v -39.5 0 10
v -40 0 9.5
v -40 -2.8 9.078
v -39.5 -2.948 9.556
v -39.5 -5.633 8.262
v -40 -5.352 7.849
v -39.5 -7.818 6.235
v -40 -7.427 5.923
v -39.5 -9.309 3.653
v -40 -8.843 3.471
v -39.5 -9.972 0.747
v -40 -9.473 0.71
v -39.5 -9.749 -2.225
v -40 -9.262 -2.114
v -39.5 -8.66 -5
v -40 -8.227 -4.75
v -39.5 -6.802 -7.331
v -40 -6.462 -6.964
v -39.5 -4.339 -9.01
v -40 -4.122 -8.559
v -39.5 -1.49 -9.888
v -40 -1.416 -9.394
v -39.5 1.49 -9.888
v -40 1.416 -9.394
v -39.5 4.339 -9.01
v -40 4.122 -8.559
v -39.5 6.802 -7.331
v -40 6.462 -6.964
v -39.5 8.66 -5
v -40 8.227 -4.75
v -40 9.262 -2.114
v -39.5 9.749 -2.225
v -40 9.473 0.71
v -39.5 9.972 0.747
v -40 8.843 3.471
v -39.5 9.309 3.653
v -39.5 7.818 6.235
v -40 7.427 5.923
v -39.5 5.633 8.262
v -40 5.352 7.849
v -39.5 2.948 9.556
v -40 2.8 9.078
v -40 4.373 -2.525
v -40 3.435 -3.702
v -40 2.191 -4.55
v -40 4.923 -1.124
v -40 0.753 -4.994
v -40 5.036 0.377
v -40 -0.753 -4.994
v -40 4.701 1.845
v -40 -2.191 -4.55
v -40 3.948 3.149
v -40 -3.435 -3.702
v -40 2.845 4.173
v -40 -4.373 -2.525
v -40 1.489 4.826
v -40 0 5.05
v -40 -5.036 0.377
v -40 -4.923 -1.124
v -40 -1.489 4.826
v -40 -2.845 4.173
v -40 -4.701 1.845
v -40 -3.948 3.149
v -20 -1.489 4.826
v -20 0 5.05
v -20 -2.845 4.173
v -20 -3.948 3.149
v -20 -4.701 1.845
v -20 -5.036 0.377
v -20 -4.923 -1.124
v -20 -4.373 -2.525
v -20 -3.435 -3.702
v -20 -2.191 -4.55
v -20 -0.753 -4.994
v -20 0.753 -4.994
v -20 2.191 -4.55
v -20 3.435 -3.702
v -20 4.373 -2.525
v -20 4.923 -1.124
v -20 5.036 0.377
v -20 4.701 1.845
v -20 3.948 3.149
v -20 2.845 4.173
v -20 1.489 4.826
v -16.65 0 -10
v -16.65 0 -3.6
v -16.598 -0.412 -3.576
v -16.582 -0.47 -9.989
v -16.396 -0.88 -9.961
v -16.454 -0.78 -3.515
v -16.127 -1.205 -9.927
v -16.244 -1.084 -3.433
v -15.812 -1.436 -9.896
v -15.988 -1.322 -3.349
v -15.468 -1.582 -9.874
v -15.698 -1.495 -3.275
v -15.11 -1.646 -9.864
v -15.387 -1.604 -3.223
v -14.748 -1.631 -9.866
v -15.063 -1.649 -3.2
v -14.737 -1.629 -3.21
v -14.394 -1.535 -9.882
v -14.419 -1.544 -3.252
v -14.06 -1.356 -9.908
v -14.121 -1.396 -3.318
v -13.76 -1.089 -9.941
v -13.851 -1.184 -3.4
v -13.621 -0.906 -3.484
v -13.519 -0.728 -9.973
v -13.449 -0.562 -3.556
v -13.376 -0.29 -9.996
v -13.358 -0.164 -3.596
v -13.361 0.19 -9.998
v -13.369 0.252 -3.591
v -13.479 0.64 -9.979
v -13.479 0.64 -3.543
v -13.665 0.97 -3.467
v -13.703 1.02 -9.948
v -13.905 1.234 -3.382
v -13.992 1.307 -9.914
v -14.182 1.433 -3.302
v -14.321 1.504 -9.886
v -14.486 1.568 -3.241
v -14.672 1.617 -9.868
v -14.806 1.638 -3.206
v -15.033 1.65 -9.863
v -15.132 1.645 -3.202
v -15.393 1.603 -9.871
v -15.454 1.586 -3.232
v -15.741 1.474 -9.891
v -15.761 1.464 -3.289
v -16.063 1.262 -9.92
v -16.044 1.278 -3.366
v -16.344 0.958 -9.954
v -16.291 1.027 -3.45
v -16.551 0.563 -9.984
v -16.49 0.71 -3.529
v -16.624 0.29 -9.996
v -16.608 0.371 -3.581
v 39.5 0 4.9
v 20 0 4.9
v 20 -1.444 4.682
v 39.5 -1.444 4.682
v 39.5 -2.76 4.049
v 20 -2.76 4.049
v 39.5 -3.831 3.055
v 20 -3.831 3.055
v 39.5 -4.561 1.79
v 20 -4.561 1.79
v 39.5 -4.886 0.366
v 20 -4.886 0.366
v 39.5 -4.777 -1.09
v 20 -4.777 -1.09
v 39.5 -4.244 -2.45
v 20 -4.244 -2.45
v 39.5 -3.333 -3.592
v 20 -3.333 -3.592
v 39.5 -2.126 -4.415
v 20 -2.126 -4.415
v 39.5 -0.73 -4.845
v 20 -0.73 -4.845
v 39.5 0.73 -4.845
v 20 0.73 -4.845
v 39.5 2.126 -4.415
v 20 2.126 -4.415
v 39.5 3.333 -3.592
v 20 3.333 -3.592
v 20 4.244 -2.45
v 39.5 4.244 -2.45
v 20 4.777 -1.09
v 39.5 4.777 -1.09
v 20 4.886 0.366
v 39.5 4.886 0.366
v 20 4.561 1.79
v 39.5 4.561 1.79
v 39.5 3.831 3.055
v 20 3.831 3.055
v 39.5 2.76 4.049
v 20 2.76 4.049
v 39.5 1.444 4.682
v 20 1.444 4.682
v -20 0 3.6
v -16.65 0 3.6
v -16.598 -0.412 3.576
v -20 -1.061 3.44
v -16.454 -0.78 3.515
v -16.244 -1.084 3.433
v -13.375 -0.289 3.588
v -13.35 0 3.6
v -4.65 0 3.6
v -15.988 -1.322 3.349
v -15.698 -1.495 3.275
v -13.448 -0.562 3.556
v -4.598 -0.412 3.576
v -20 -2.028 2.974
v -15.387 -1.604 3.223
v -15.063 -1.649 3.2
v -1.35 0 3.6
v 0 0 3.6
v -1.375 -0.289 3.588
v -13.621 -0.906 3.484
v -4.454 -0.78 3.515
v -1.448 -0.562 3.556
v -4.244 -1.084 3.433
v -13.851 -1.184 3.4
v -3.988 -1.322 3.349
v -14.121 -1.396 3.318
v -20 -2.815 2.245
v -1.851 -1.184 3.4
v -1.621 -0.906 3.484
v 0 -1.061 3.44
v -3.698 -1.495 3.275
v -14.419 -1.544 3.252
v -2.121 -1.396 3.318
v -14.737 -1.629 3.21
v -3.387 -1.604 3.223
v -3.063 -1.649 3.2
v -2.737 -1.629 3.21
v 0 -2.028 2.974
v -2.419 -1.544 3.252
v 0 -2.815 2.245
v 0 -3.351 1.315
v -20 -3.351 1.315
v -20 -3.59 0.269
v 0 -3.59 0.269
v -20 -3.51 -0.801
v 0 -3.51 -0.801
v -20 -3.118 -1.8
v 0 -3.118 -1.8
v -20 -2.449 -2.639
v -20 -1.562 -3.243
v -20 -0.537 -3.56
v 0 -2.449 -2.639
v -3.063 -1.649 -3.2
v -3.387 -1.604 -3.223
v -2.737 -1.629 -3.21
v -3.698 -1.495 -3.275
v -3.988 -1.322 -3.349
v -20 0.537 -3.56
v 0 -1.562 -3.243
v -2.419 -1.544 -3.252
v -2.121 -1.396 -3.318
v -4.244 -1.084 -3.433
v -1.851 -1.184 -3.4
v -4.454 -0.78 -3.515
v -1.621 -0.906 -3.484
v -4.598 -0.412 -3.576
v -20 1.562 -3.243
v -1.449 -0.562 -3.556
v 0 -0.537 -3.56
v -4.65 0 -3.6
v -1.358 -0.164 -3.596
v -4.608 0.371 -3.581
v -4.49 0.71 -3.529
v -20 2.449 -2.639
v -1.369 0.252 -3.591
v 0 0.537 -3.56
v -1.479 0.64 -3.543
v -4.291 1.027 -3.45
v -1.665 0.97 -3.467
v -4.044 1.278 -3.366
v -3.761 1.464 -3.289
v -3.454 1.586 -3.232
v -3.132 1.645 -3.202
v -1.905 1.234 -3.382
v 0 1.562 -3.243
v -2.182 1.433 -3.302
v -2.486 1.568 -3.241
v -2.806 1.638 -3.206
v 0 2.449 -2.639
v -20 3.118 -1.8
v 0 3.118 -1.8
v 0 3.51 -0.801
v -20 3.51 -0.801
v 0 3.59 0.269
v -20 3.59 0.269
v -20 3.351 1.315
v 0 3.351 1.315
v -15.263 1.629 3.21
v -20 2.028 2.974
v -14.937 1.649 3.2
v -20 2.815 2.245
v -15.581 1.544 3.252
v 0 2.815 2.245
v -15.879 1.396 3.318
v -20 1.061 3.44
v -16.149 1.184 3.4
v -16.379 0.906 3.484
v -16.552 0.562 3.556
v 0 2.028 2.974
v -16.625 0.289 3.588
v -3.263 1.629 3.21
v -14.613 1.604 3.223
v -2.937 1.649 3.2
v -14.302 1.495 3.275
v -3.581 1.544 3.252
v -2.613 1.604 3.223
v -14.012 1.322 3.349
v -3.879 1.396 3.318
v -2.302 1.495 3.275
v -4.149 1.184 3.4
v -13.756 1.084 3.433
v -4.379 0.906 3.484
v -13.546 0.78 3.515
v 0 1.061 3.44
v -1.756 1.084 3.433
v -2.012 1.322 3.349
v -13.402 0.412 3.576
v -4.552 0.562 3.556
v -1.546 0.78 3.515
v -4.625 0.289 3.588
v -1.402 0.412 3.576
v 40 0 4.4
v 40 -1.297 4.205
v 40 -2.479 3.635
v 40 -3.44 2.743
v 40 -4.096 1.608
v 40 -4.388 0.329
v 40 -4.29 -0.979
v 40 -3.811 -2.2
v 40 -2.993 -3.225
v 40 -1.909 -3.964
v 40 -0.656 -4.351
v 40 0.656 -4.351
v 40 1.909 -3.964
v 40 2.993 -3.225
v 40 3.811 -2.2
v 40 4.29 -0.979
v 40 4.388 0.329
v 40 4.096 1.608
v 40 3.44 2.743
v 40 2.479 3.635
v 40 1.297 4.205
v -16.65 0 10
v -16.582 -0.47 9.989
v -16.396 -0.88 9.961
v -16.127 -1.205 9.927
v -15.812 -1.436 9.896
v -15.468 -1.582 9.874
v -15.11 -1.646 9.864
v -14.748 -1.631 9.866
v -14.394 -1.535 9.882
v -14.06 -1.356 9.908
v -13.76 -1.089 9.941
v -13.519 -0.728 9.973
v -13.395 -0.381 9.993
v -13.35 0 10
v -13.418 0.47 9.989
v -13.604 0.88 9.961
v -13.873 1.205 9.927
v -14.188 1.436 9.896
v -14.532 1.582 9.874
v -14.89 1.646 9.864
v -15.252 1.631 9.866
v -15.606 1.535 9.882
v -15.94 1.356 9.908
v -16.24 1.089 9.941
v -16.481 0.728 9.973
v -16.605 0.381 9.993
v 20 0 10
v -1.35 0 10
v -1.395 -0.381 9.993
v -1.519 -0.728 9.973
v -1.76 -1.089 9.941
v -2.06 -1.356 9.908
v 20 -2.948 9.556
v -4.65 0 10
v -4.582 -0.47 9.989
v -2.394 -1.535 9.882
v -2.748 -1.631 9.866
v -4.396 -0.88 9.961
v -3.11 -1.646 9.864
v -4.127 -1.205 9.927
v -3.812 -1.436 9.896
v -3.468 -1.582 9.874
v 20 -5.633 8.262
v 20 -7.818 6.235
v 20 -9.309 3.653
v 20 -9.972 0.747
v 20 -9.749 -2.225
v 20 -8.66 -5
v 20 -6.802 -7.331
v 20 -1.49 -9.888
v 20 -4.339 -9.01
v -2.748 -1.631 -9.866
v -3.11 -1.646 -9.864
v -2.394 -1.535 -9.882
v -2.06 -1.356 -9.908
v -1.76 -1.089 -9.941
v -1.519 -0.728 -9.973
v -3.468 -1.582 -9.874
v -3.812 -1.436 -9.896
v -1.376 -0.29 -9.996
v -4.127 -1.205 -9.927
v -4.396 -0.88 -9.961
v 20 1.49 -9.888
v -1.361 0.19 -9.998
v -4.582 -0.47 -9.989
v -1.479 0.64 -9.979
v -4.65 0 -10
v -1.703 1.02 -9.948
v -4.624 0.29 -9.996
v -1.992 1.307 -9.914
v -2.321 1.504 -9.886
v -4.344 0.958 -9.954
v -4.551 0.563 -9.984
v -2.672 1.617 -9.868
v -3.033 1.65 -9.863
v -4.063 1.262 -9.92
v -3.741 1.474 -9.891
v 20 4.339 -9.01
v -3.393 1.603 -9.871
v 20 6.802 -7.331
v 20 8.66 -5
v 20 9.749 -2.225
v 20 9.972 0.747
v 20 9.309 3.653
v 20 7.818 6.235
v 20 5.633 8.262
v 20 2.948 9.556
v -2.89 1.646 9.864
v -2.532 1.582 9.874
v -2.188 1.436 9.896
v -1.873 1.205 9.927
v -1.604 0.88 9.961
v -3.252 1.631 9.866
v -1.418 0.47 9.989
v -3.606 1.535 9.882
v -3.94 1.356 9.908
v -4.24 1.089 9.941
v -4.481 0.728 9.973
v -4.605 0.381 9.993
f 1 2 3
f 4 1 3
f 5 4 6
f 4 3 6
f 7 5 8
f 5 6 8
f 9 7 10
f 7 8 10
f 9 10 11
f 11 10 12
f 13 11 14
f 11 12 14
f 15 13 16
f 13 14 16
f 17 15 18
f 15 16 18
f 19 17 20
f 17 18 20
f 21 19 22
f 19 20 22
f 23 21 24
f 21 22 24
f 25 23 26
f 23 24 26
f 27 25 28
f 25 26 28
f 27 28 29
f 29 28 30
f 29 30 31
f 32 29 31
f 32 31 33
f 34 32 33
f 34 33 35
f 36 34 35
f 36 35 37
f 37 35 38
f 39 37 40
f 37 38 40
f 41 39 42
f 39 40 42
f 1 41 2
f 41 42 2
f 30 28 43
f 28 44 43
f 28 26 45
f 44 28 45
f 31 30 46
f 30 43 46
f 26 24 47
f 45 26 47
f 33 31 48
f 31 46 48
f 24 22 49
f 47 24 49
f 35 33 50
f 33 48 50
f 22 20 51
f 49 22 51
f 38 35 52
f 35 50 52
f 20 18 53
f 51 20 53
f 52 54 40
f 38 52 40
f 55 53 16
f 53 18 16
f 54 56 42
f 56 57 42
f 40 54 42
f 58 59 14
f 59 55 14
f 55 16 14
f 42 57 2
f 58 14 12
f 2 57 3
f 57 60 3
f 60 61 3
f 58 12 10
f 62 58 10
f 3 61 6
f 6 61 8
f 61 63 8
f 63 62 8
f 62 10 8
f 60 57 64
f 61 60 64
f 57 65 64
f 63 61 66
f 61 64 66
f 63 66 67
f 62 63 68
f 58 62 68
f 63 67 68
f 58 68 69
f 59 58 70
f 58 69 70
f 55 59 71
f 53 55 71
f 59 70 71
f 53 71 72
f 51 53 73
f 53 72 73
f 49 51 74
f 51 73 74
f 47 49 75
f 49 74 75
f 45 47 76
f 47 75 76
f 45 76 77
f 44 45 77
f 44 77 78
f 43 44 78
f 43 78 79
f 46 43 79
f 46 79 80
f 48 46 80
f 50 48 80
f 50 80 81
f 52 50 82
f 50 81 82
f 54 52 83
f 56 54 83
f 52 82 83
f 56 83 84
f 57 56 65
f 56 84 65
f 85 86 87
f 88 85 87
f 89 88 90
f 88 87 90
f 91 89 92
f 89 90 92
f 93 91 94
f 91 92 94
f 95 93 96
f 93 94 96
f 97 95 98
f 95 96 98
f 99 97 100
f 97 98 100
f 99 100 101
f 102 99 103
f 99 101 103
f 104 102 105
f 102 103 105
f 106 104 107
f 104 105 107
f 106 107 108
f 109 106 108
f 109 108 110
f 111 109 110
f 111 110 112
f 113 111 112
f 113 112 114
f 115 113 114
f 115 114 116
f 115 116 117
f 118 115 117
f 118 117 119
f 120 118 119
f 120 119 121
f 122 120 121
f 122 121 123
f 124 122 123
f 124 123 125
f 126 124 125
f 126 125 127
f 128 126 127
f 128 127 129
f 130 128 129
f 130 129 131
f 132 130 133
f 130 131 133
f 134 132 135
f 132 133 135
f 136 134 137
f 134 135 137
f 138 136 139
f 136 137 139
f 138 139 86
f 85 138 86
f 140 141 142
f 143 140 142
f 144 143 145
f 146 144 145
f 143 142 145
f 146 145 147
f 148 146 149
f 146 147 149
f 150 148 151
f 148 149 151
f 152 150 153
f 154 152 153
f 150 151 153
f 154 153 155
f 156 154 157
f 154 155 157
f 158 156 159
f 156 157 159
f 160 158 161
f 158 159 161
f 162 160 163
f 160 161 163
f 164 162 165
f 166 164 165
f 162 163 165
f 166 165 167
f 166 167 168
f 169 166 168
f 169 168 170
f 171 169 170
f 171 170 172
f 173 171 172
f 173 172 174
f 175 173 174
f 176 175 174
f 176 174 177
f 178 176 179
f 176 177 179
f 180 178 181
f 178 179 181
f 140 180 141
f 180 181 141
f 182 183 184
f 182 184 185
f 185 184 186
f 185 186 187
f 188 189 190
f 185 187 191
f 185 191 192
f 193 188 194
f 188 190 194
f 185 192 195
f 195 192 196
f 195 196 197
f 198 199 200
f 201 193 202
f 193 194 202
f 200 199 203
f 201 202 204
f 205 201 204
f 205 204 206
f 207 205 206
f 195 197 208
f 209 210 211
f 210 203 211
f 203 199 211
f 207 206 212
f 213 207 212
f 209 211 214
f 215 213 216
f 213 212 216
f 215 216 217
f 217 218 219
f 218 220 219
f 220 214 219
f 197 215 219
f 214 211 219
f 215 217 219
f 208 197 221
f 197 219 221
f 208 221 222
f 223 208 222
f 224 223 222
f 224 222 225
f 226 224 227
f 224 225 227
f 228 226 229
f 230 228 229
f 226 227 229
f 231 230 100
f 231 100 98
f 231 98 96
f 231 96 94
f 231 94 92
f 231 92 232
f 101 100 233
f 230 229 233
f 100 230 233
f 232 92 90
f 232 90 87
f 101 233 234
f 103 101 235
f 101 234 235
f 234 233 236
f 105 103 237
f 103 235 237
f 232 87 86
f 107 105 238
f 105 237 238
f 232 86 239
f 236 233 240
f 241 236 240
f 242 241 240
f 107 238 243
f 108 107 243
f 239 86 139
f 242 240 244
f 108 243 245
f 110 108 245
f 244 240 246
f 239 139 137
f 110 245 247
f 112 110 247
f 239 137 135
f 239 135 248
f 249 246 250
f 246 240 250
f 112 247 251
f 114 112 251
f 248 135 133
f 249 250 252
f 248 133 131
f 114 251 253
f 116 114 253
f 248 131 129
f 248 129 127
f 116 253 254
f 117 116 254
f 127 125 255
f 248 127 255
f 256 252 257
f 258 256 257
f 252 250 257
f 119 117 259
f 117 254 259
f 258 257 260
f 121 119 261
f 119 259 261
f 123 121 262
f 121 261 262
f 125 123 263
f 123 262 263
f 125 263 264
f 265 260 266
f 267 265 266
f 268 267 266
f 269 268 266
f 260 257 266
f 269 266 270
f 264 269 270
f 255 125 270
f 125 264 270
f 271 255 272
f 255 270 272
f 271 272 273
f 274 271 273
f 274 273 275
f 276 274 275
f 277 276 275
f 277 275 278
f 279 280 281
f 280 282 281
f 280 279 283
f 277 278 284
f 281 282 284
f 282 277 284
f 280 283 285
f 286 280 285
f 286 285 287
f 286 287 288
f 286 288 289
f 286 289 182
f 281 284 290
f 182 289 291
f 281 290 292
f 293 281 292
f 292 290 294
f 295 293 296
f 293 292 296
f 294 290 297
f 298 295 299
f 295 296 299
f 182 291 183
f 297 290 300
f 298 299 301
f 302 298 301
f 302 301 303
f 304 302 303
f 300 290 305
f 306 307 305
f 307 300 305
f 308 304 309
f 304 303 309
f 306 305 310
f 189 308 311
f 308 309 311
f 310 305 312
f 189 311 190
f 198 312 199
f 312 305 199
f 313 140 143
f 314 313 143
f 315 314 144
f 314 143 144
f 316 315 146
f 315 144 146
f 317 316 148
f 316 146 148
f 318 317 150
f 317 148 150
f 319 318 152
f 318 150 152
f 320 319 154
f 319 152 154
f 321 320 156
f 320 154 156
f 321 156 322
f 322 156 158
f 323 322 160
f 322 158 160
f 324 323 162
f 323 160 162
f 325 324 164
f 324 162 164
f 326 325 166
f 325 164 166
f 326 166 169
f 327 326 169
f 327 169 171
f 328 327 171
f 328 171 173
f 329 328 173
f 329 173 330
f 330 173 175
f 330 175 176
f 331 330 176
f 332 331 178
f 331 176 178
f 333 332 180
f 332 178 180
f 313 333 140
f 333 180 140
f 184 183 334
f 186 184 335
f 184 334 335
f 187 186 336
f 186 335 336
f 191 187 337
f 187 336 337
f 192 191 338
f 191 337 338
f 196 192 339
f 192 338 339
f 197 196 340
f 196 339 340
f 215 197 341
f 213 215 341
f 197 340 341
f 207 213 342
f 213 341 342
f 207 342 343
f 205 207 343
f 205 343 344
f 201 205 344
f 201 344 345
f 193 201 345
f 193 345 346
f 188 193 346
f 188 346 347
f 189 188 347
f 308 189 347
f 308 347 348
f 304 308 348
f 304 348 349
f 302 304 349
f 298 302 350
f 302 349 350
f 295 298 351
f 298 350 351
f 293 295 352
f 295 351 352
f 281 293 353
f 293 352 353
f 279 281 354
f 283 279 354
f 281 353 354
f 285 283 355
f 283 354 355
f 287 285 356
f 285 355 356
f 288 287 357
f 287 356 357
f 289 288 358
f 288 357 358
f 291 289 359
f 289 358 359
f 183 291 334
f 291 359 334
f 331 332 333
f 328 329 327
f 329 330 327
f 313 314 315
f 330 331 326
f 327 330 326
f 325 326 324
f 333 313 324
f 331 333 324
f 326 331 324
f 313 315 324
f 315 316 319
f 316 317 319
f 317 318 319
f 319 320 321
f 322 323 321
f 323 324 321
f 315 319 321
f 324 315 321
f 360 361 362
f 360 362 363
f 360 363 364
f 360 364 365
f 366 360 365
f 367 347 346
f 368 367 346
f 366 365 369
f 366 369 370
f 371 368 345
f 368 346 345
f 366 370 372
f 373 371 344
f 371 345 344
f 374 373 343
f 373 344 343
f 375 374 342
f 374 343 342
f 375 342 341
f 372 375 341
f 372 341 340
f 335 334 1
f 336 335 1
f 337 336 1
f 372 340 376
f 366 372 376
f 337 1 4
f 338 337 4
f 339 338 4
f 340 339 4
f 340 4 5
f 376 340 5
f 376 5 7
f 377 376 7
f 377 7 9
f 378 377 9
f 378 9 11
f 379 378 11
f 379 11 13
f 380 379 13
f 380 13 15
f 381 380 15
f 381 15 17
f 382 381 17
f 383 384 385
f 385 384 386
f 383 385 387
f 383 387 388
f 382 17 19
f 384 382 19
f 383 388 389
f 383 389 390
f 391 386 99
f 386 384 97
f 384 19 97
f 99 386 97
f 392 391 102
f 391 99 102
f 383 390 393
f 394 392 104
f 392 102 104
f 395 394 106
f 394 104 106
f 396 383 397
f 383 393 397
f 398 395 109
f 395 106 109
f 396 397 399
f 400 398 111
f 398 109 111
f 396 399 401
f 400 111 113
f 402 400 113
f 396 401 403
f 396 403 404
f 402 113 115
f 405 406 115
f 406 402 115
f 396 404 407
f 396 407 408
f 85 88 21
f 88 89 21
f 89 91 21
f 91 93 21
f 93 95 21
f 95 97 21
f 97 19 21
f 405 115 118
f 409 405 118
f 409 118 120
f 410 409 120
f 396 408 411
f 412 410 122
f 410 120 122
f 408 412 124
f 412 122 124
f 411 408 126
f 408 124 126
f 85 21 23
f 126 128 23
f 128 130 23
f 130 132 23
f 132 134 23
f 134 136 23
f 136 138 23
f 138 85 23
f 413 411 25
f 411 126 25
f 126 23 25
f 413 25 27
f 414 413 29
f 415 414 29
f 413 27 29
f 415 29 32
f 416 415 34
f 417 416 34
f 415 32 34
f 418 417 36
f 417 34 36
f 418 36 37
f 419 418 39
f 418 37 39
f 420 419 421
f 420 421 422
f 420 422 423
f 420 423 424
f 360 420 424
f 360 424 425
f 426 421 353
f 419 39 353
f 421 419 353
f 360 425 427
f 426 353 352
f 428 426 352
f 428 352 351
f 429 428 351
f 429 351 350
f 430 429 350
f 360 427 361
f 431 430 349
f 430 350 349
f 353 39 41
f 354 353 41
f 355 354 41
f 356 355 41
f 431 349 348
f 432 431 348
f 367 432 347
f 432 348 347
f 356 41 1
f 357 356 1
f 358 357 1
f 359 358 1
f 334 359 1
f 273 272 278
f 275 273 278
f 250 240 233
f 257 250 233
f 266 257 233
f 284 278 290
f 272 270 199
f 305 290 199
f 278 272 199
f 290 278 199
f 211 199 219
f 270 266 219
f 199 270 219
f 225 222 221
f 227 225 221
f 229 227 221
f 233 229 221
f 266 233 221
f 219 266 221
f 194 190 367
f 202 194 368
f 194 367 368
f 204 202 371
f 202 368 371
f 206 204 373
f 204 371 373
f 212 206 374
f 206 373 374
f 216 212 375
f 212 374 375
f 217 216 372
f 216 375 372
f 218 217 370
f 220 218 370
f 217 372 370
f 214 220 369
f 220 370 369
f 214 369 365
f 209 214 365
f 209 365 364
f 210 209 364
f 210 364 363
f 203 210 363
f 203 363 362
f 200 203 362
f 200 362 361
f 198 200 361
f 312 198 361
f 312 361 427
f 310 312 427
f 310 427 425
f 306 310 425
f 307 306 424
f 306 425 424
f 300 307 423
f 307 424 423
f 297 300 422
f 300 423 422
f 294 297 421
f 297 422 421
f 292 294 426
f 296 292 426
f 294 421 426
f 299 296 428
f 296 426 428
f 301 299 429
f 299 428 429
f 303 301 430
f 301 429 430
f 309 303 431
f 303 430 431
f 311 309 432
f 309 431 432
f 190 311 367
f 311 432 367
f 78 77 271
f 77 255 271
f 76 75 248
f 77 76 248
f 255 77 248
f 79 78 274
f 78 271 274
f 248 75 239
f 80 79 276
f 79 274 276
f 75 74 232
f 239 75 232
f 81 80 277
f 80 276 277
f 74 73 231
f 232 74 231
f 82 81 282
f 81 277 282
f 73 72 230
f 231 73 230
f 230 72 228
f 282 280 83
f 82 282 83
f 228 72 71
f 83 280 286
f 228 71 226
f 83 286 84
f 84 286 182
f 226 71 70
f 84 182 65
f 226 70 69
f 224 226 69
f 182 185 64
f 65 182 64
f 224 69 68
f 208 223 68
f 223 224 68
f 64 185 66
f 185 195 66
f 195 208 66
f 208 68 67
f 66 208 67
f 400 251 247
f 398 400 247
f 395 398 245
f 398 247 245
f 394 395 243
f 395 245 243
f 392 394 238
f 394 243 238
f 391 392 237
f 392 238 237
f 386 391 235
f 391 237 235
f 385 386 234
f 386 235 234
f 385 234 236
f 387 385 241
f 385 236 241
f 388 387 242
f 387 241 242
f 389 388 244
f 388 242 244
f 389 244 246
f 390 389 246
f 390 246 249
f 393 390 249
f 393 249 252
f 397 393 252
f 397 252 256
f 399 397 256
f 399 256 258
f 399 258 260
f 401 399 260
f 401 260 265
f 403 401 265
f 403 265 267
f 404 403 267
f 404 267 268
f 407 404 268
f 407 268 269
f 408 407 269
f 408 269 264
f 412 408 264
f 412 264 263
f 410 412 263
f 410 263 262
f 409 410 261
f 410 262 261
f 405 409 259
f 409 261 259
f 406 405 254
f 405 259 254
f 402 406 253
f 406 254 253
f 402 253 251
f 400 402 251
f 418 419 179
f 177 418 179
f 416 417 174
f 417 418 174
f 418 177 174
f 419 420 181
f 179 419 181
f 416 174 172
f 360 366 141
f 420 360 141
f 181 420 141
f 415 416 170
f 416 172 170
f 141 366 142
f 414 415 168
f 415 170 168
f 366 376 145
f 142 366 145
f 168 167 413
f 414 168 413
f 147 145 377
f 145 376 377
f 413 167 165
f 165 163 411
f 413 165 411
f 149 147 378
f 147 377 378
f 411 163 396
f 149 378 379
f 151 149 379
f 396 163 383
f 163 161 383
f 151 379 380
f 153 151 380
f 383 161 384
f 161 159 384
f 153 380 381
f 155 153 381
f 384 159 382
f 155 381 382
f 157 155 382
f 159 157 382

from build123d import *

# Parameters (mm, degrees)
F3_SIZE = 0.5
F5_D    = 3.3


with BuildPart() as f1:
    # F0 (on Front) → F1 (revolve)
    with BuildSketch(Plane.XZ):
        Polygon((0, 3.6), (0, 0), (40, 0), (40, 4.9), (20, 4.9), (20, 10), (-40, 10), (-40, 5.05), (-20, 5.05), (-20, 3.6), align=None)
    revolve(axis=Axis((-1.4153197408, 0, 0), (1, 0, 0)))

    # F3
    f3_edges = [f1.edges().sort_by_distance(p)[0] for p in [
        (-40, 0, -10),
        (40, 0, -4.9),
    ]]
    chamfer(f3_edges, length=F3_SIZE)

    # F5 (through all)
    with Locations(Plane(origin=(0, 0, -25), x_dir=(1, 0, 0), z_dir=(0, 0, -1))):
        with Locations((-15, 0), (-3, 0)):
            Hole(F5_D / 2)


solid = f1.part
